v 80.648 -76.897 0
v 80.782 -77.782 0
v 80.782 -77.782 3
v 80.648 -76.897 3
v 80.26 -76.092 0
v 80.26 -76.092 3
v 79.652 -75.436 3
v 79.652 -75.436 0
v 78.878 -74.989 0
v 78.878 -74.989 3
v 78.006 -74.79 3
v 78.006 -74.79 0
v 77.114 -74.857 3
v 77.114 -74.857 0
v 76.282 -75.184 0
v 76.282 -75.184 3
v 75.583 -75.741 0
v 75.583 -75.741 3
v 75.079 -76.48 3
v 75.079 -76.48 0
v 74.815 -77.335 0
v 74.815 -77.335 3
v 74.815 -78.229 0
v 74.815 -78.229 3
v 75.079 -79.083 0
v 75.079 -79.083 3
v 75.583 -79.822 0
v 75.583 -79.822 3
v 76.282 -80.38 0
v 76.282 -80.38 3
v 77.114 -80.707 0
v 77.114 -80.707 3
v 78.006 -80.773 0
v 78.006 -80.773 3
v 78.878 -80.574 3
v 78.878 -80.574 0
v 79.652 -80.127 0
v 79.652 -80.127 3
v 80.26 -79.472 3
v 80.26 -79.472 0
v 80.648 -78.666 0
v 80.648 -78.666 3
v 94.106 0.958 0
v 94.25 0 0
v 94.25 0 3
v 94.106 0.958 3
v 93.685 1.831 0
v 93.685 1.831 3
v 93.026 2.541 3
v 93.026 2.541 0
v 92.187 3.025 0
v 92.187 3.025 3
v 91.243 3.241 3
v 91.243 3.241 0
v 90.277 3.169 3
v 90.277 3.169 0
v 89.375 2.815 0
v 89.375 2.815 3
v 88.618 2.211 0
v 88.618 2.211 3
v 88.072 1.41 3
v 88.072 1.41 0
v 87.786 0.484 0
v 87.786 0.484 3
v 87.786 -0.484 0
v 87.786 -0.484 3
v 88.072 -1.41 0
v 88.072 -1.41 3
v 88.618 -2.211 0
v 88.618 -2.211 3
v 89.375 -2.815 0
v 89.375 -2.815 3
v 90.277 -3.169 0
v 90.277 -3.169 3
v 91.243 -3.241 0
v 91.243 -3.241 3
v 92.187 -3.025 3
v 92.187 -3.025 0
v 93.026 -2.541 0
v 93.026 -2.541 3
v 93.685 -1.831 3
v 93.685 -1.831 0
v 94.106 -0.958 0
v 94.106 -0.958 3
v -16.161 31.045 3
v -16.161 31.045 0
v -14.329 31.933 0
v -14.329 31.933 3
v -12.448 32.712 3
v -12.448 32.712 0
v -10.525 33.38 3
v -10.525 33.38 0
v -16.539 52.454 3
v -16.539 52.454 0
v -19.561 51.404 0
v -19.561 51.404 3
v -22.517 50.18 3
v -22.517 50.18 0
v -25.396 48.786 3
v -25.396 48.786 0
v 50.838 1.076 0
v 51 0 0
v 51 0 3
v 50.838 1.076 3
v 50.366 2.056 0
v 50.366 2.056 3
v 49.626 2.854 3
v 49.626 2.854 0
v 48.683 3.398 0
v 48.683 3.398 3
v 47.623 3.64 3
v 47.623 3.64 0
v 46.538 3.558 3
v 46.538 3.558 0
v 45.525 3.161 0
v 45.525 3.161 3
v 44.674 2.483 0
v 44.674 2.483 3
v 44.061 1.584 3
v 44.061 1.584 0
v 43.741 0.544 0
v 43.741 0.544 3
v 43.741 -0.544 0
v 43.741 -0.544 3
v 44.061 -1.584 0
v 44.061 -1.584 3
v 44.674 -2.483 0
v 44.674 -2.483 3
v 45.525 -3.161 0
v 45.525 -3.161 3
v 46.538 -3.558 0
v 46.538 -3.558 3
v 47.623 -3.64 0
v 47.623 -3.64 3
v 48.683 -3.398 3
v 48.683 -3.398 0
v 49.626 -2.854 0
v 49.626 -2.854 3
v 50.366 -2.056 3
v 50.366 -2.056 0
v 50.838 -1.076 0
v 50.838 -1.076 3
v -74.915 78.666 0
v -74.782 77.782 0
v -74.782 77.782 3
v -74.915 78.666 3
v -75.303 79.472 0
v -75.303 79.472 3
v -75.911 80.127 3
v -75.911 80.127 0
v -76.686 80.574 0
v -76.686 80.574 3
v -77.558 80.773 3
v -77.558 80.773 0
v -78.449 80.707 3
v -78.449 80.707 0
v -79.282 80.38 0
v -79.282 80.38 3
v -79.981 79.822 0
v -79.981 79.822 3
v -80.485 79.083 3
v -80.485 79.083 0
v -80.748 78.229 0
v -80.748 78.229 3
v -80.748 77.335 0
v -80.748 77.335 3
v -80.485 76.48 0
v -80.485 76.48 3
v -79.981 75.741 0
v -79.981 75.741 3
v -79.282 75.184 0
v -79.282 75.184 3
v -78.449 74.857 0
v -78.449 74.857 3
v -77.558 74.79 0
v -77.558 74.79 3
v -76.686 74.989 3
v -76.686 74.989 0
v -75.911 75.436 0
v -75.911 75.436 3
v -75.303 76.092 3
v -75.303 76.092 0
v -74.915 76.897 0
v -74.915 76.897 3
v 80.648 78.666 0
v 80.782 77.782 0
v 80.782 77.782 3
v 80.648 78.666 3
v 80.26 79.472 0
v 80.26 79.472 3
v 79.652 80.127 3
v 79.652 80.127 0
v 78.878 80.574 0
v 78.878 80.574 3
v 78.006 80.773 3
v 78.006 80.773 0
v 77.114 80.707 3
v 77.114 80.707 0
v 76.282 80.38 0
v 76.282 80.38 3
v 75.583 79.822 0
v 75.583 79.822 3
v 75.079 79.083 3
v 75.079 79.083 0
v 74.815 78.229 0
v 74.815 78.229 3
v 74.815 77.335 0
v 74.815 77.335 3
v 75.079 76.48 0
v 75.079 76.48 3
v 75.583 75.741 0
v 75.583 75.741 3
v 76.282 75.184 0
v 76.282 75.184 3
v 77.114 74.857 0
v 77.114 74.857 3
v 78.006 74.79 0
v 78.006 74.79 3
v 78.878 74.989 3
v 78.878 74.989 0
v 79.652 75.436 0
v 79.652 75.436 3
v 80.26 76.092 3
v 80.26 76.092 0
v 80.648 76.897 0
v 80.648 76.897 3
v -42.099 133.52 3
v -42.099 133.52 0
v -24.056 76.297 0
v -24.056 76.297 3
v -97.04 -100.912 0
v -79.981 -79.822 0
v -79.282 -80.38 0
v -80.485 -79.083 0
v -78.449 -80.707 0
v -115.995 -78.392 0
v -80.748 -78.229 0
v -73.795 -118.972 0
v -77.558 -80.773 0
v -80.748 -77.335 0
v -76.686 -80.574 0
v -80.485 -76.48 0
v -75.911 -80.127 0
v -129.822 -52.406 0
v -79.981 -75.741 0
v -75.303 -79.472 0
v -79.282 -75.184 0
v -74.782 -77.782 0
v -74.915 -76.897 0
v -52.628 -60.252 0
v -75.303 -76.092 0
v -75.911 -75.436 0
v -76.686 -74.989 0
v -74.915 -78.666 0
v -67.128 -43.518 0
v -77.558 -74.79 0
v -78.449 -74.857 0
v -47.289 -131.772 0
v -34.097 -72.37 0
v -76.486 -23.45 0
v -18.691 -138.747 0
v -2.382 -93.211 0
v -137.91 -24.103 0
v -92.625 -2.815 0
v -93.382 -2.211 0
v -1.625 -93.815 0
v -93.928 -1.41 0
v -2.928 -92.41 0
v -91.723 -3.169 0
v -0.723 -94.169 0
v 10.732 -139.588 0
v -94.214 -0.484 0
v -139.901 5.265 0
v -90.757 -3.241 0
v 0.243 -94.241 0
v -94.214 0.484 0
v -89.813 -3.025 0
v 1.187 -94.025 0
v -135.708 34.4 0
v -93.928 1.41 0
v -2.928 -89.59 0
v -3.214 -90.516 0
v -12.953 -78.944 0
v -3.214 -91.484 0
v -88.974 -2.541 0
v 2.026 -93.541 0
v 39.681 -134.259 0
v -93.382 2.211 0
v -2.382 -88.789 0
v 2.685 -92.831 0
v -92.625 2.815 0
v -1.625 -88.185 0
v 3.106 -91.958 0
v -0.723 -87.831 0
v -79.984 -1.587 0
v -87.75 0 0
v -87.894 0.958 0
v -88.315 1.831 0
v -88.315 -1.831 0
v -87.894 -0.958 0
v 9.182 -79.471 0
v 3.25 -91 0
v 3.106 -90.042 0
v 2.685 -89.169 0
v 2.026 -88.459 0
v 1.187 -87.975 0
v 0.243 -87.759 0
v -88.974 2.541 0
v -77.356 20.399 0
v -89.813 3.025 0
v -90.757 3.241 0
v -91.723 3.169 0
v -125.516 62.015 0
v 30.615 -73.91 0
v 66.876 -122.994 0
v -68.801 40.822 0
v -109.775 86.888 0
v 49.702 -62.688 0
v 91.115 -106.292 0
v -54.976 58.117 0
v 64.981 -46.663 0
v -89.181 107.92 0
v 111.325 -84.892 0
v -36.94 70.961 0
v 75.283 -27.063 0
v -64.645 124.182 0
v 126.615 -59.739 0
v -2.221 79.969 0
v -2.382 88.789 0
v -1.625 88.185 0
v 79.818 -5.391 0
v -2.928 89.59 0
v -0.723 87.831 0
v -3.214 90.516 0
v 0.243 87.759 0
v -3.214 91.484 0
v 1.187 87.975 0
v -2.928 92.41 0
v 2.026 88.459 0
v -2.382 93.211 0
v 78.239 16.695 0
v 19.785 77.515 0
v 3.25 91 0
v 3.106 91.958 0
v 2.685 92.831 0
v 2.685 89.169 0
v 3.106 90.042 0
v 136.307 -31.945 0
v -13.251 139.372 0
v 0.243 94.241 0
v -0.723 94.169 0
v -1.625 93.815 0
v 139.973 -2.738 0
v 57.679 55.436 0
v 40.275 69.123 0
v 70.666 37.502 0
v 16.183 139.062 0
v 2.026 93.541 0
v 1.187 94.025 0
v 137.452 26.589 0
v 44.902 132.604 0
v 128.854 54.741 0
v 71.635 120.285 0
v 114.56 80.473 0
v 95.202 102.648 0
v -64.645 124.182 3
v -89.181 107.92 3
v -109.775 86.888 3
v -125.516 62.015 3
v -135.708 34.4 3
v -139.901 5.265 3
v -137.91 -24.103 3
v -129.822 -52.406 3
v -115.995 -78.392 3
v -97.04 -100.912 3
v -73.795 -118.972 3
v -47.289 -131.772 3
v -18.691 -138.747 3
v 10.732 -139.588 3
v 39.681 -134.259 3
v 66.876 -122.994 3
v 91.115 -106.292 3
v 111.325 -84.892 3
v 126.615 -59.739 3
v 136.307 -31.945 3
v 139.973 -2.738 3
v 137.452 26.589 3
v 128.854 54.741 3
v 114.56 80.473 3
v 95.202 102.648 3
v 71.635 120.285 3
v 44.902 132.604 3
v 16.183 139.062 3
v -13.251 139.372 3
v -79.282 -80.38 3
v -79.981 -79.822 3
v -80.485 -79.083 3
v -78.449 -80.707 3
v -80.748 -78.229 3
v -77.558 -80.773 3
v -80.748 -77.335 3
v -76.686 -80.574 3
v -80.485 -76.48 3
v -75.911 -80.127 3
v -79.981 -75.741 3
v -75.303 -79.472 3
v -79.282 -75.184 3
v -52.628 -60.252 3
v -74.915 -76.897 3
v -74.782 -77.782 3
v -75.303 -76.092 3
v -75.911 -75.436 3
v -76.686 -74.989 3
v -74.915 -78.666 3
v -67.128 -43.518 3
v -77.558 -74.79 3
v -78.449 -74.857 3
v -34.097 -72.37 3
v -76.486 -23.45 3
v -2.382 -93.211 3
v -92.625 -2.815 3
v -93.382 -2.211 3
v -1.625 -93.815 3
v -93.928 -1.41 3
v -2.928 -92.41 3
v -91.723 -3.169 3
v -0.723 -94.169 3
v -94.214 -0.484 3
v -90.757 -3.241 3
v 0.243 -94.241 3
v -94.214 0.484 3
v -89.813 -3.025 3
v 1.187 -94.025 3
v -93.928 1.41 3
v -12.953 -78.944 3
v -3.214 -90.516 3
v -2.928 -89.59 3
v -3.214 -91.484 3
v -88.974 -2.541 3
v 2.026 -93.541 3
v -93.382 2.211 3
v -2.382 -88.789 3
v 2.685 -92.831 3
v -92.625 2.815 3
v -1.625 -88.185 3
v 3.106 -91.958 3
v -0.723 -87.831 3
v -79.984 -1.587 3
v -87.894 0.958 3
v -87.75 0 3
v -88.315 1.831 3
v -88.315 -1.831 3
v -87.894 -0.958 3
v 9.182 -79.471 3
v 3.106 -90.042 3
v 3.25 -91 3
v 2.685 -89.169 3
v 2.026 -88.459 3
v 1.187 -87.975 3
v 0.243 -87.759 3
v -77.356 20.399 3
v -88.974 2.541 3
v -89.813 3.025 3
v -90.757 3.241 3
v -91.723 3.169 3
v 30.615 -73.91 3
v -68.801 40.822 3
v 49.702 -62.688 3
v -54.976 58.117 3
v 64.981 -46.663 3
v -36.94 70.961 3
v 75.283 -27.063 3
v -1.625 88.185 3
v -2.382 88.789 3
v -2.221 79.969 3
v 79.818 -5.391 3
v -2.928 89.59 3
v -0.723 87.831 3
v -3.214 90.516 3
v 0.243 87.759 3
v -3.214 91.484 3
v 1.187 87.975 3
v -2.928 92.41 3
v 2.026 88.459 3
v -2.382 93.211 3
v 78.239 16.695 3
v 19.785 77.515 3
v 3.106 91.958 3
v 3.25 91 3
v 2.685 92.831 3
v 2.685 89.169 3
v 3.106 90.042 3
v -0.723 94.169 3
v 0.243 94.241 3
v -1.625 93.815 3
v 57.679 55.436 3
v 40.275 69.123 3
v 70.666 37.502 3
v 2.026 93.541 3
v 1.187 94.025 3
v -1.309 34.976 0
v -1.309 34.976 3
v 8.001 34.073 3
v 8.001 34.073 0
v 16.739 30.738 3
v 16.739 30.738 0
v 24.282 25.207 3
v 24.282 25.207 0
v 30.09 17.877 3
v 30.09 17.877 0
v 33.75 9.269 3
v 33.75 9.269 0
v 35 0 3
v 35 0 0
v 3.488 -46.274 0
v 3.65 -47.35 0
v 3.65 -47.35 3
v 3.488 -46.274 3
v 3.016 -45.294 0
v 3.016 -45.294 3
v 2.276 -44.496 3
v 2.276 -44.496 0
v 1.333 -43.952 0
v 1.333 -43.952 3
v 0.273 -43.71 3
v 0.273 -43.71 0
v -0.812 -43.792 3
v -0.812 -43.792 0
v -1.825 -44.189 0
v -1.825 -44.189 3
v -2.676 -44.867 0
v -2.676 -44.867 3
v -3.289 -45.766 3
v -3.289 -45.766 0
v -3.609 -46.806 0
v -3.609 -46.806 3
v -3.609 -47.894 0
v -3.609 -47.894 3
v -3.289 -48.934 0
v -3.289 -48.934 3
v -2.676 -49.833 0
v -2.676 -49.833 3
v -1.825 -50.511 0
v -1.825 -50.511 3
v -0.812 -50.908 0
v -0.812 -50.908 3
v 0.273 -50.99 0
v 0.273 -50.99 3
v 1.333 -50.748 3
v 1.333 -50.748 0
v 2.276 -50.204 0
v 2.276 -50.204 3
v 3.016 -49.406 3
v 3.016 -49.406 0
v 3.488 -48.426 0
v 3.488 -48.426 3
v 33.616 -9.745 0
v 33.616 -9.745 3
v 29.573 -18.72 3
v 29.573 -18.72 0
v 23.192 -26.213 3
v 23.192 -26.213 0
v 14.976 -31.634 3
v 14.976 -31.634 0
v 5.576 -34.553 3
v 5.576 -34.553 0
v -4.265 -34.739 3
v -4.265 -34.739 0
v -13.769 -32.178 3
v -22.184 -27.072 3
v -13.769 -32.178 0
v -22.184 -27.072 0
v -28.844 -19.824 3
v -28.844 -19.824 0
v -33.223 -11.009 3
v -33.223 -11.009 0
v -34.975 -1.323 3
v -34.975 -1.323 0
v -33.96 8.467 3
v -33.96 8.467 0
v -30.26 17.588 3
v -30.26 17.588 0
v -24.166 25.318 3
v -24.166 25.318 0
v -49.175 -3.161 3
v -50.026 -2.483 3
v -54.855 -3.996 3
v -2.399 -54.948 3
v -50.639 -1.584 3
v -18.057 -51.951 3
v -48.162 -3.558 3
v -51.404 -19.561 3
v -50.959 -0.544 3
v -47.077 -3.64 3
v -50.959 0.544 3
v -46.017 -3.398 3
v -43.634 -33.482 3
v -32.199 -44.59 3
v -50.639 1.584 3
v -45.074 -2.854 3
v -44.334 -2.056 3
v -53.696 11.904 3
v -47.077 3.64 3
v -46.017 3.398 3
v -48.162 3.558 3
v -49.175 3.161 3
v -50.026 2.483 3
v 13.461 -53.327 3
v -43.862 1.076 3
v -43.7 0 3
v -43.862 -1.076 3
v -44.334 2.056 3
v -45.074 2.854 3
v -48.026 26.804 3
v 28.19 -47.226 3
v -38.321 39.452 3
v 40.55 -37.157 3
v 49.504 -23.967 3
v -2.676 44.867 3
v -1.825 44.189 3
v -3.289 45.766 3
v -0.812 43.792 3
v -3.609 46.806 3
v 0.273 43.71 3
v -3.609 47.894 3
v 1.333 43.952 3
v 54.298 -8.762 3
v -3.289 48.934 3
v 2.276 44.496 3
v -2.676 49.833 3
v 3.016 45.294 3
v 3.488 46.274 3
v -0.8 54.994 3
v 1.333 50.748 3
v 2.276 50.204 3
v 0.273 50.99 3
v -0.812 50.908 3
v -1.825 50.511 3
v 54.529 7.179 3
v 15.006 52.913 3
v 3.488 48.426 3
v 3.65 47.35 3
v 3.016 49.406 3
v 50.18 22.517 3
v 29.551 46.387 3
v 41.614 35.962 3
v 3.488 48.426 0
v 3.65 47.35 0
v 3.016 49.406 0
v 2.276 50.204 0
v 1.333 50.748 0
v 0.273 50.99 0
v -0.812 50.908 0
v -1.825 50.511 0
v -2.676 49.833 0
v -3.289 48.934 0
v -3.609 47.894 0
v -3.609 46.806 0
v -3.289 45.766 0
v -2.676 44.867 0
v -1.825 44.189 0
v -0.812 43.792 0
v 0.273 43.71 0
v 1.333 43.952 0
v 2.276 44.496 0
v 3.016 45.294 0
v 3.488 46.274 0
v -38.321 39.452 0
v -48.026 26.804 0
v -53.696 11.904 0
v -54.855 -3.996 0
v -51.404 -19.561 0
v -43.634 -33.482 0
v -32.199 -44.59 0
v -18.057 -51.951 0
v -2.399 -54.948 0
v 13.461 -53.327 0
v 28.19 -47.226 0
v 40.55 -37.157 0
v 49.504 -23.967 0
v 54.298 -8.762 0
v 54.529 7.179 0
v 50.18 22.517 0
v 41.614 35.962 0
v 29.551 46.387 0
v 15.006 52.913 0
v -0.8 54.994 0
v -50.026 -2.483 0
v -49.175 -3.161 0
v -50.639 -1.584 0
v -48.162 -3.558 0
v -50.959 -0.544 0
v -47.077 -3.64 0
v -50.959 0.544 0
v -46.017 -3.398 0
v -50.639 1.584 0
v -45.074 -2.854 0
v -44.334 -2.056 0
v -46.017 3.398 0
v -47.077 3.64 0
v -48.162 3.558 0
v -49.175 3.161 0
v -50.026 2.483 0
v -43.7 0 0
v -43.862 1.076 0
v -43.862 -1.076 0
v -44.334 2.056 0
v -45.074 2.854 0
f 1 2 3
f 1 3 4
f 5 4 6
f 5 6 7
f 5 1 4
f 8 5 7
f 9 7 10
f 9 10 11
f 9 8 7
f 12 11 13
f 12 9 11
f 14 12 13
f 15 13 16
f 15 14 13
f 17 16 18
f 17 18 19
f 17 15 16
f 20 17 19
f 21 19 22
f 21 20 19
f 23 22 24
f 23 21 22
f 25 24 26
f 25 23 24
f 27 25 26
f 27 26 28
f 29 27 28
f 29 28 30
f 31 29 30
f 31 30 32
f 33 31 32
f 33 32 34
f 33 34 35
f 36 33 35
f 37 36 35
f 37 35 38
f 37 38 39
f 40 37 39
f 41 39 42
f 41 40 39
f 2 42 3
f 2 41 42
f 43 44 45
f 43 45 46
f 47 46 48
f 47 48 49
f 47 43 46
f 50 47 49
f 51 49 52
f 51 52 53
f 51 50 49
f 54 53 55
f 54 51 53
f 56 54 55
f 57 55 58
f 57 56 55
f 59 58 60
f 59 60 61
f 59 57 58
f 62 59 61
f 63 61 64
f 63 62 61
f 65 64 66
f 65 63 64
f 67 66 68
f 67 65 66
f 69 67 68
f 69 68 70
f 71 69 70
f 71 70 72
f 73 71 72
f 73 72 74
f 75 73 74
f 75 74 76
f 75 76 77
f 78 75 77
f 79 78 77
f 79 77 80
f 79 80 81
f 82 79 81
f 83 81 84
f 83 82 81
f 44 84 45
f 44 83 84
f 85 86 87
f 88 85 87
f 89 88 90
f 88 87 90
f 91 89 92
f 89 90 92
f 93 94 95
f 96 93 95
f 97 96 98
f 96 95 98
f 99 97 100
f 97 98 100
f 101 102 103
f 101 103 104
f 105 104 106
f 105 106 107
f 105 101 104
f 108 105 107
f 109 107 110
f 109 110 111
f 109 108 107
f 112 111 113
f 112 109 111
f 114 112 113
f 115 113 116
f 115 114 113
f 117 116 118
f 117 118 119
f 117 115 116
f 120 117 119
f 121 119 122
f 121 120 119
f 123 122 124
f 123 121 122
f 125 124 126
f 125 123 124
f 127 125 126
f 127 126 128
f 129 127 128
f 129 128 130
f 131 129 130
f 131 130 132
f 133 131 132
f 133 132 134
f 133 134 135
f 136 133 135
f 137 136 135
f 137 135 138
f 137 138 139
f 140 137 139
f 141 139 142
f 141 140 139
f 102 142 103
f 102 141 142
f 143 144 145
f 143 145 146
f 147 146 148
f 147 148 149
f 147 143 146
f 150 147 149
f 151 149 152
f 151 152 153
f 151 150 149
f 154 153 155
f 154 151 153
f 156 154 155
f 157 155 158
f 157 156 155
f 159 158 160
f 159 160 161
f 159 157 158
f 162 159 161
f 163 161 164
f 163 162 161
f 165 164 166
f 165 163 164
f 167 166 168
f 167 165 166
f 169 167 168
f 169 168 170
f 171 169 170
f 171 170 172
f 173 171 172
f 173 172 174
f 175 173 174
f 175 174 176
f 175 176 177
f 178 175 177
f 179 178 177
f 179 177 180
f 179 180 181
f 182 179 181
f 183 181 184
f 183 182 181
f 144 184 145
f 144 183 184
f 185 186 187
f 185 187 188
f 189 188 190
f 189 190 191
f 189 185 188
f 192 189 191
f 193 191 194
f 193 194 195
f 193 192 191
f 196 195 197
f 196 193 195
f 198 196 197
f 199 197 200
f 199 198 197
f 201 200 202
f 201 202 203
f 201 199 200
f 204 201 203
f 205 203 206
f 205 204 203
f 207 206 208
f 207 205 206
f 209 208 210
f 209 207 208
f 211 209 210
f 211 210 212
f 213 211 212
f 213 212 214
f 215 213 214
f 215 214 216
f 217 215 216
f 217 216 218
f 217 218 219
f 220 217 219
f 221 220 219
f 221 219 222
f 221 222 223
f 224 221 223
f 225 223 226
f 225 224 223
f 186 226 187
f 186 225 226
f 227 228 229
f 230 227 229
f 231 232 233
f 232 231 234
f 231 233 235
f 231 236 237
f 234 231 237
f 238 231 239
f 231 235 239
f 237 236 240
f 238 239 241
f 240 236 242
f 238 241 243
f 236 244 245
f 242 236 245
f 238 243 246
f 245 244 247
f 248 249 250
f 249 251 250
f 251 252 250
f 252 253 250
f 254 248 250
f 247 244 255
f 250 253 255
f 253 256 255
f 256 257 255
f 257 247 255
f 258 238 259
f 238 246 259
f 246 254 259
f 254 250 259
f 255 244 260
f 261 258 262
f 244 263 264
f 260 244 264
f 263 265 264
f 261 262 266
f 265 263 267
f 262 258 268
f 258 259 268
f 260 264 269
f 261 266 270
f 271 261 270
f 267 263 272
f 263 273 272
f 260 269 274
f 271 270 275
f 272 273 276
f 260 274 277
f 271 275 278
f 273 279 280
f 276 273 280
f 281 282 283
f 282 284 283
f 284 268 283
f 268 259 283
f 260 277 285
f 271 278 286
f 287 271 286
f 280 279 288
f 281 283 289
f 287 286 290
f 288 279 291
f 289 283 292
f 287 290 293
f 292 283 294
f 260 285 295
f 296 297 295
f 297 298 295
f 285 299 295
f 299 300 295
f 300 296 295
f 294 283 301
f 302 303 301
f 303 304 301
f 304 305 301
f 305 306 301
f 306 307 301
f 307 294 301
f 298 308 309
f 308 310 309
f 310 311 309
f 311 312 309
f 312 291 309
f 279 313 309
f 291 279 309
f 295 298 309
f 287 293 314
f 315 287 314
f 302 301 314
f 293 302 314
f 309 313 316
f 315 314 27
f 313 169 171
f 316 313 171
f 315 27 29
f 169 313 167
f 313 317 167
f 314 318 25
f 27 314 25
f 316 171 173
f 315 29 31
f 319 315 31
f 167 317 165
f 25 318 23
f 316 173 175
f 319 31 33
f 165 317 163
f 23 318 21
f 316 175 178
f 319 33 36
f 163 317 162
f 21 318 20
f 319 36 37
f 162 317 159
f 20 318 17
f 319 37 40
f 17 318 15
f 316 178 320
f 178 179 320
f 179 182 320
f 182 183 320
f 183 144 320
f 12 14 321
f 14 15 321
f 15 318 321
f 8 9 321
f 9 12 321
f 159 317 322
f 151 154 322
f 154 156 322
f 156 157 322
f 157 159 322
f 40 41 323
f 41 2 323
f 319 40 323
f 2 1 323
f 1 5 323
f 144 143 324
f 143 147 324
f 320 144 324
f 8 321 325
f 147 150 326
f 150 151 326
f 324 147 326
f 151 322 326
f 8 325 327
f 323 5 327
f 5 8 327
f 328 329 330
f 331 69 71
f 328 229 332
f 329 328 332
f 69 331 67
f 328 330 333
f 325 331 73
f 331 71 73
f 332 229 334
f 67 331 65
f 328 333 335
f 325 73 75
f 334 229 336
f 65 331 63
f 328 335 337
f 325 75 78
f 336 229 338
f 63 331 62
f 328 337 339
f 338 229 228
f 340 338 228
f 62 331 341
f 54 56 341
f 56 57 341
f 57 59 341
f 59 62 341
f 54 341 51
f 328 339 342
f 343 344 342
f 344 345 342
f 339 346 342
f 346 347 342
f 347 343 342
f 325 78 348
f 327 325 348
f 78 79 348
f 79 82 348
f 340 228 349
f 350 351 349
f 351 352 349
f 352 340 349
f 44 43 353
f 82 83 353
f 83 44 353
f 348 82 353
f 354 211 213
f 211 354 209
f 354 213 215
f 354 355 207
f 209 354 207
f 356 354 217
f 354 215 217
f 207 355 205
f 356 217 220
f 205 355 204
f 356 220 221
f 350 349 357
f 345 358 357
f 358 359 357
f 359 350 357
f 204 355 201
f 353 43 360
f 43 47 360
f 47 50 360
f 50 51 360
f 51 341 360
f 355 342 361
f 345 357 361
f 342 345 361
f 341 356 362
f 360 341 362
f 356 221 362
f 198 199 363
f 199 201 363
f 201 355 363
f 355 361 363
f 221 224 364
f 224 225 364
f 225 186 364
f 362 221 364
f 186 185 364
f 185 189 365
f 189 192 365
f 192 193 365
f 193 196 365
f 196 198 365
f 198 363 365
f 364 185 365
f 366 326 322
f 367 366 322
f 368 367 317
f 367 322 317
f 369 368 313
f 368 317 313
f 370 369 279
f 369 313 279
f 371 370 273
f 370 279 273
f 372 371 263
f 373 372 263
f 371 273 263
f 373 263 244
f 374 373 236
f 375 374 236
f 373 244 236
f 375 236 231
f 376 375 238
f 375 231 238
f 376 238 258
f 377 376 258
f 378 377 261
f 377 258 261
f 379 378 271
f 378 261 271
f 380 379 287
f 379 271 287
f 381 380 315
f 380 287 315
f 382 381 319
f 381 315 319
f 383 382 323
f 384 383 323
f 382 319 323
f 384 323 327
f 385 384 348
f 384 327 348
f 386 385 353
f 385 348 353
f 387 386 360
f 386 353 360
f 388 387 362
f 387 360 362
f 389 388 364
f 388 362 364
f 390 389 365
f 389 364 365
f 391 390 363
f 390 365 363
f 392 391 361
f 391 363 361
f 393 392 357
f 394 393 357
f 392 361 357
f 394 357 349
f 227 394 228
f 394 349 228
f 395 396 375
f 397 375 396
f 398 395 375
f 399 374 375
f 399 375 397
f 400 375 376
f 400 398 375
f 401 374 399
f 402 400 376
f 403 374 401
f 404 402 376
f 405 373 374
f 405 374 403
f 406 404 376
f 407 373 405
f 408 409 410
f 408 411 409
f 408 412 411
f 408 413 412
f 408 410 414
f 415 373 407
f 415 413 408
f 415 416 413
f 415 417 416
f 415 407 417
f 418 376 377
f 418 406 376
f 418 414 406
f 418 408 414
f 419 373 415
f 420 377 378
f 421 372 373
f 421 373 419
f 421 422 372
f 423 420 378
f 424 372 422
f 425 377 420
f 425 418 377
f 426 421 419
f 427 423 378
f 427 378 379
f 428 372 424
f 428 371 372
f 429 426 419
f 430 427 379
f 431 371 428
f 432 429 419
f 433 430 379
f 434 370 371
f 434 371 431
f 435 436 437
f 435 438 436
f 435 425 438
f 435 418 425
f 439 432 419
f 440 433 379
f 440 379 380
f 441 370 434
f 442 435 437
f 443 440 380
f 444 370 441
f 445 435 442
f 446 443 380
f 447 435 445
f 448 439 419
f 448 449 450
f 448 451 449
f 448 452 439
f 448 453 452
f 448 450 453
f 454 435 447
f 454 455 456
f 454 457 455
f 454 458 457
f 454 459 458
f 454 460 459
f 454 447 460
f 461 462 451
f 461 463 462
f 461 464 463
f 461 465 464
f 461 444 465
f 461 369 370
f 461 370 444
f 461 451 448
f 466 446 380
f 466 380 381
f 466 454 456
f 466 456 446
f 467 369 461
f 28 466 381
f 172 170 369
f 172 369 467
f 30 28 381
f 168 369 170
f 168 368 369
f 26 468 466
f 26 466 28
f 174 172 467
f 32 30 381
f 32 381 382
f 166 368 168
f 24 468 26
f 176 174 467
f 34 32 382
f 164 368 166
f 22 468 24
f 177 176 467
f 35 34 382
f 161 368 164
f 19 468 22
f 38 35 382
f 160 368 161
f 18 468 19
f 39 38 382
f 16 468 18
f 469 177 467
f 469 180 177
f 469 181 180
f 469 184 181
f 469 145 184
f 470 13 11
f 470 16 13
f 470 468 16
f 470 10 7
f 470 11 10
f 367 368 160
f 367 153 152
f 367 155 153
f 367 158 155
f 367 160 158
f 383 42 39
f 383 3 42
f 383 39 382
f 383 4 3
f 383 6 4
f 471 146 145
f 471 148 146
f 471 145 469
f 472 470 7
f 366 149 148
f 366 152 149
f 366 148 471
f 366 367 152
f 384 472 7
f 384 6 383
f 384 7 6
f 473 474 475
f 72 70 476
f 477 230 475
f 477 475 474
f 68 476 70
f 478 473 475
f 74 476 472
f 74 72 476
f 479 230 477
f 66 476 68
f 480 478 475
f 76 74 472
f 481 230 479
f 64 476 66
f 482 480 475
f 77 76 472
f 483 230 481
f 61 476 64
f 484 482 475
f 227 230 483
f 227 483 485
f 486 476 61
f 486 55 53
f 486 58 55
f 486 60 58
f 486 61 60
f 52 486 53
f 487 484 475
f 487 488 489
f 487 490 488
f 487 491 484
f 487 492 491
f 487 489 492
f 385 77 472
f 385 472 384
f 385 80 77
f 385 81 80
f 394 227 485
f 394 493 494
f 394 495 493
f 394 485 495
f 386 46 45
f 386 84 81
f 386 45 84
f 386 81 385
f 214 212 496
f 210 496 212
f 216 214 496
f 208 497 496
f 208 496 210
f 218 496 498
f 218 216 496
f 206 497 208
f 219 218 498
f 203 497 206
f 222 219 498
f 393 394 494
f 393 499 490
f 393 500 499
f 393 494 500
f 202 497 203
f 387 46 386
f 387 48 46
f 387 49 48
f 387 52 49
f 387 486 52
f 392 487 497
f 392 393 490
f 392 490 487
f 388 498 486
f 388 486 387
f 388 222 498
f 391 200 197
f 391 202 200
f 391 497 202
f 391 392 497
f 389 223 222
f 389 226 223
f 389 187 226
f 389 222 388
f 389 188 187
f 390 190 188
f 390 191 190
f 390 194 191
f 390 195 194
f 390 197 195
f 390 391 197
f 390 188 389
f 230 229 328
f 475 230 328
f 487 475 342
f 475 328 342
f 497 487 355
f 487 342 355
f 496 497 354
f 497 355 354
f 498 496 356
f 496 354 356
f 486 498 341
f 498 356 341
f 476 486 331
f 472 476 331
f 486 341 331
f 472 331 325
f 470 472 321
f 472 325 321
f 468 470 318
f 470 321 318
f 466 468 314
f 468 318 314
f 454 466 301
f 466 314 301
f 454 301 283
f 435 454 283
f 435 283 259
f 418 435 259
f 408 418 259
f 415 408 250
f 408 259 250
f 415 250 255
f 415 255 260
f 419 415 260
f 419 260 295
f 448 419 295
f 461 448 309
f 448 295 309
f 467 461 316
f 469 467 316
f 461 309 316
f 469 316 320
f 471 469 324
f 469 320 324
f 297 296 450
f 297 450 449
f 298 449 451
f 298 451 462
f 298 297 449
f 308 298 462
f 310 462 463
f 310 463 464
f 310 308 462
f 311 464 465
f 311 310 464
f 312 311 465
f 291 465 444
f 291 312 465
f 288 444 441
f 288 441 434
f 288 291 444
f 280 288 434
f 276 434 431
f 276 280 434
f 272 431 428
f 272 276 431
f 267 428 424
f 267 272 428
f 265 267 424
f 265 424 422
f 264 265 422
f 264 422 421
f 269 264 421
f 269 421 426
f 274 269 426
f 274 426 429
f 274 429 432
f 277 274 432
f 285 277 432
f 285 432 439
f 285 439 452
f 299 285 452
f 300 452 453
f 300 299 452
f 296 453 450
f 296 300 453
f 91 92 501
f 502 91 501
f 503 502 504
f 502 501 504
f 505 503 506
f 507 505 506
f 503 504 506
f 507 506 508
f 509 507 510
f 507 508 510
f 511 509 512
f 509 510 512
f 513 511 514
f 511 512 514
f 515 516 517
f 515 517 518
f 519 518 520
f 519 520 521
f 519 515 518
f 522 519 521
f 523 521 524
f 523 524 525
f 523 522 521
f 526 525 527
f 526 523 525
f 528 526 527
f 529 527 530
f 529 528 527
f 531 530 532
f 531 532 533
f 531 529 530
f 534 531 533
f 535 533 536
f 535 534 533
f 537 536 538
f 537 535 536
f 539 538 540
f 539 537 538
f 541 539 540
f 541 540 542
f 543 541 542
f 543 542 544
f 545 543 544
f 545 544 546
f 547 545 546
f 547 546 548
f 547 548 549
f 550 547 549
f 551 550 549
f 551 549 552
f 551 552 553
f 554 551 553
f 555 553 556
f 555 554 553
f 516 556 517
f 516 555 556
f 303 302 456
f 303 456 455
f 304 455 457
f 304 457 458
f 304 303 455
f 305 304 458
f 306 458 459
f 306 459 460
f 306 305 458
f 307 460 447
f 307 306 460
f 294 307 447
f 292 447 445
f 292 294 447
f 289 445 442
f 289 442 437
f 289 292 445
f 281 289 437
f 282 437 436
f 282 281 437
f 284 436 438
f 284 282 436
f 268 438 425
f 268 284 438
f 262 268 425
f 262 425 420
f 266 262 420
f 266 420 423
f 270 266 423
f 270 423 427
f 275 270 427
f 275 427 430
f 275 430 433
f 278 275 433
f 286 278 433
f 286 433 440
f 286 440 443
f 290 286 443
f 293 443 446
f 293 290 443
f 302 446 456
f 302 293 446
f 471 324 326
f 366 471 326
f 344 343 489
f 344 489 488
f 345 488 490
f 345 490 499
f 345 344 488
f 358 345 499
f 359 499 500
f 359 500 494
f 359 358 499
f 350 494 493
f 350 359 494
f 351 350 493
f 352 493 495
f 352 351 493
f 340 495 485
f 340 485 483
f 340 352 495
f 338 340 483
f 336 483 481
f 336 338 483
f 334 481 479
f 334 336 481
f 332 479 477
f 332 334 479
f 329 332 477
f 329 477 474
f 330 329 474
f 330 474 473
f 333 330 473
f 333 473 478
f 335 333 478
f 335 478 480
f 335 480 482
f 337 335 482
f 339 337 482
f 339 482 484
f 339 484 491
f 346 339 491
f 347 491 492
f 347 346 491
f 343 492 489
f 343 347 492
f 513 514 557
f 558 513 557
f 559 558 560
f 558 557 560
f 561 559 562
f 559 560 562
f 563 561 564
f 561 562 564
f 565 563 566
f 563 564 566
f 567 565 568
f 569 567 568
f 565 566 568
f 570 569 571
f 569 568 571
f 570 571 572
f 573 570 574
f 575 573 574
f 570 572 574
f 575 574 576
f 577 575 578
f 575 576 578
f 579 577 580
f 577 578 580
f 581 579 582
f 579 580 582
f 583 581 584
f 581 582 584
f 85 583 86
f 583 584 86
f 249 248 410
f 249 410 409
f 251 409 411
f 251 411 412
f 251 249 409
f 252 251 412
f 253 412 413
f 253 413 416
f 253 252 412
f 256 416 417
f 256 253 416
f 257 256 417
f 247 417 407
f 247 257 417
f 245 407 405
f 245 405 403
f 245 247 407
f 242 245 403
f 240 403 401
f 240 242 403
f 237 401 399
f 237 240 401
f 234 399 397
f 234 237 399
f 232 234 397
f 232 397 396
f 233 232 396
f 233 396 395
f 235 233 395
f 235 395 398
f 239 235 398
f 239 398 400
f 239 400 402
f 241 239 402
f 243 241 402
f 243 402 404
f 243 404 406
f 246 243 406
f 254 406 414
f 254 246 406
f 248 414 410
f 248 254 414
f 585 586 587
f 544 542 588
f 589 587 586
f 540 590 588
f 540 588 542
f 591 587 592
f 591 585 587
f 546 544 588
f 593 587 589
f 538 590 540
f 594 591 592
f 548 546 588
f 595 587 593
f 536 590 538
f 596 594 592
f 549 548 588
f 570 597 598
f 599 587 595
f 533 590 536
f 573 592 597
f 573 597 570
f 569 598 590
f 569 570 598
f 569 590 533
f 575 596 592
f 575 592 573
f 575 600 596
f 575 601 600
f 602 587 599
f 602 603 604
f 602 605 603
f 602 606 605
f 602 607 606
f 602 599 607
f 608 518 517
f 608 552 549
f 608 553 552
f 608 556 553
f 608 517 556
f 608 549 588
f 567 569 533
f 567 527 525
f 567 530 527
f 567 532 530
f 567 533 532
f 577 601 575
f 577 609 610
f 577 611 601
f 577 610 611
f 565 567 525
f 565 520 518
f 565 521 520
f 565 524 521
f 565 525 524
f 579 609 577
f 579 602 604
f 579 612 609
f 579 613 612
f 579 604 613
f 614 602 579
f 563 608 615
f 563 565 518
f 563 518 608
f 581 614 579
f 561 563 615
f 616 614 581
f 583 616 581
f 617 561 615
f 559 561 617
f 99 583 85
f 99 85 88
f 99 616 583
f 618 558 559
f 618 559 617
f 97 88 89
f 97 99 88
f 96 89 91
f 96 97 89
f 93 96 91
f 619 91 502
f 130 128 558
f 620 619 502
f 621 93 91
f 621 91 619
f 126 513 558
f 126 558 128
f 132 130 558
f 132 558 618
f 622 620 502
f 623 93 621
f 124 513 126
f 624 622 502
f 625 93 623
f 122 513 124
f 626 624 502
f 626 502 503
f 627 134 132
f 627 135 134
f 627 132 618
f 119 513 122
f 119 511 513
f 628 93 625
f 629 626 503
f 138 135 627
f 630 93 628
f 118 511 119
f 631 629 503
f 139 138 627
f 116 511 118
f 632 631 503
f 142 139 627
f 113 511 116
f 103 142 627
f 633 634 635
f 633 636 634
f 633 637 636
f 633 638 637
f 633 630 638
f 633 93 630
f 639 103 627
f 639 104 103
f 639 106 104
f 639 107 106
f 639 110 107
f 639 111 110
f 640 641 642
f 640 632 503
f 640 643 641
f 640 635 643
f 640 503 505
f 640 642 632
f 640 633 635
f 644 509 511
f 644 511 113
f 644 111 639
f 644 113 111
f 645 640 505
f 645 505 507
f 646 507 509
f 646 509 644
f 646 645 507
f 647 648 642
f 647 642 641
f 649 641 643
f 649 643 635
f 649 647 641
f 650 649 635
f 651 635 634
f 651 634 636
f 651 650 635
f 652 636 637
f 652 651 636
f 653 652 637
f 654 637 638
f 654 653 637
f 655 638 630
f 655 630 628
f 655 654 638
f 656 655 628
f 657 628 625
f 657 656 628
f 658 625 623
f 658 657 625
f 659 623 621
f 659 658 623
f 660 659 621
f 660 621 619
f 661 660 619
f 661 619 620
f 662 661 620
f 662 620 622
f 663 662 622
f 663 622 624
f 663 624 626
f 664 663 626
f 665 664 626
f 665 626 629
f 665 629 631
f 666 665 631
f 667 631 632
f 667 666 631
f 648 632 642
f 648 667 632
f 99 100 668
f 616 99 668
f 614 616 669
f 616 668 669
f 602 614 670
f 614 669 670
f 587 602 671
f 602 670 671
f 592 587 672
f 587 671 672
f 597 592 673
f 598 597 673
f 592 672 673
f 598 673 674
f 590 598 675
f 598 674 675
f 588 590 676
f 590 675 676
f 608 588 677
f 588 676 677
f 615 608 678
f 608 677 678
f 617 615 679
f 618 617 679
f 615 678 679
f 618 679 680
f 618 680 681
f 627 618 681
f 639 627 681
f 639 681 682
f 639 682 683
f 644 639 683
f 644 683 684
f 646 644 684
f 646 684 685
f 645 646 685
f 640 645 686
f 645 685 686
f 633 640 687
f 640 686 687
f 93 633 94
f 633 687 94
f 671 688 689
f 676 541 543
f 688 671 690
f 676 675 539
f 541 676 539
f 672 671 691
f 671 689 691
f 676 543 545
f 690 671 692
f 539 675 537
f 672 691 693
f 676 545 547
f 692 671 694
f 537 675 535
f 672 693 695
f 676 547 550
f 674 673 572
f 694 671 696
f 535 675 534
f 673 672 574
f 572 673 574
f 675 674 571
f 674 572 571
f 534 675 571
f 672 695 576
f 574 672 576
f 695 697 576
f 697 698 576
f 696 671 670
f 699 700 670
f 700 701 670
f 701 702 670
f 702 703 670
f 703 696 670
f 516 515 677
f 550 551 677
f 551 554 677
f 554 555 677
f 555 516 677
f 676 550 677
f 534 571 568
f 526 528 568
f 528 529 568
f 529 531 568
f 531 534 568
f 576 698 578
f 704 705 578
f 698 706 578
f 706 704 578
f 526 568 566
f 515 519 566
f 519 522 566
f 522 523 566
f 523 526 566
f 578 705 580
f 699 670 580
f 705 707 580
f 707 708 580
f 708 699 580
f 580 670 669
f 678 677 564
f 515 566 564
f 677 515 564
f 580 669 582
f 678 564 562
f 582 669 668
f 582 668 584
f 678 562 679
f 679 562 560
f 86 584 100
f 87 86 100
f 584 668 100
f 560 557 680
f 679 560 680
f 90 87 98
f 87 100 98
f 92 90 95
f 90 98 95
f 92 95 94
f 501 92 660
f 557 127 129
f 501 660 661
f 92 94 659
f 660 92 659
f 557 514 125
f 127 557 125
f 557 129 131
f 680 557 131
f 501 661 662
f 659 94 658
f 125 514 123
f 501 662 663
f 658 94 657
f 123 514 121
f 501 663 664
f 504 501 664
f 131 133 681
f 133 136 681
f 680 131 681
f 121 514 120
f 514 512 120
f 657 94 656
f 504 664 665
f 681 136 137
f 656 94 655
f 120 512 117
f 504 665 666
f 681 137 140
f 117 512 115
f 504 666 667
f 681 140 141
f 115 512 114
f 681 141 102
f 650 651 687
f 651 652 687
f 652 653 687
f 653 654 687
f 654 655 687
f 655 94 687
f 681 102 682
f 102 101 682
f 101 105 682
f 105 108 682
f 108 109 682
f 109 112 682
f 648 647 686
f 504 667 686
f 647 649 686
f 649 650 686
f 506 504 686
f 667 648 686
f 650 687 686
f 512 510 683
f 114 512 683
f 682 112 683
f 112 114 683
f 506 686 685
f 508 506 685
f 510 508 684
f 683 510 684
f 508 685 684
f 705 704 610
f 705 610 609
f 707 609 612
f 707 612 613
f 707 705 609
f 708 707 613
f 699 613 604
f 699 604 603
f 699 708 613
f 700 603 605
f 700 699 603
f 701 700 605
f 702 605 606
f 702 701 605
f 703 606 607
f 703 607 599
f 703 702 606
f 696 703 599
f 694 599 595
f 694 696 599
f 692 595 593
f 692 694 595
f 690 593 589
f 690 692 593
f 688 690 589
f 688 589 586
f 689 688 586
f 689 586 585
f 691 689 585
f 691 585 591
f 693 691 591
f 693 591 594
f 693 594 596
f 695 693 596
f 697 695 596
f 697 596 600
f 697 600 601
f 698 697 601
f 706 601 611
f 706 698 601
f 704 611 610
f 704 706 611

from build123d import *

# Parameters (mm, degrees)
F0_R     = 3
F0_R_2   = 3.25
F1_DEPTH = 3
F0_R_3   = 3.65
F2_DEPTH = 3


# Not quite as in the source:
# - a feature names something its author has since deleted; it is built from what else it names


with BuildPart() as f1:
    # F0 (on Top) → F1 (new body)
    with BuildSketch(Plane.XY):
        with BuildLine():
            ThreePointArc((-24.0564639603, 76.2973560599), (47.3047718691, 64.5155683414), (80, 0))
            ThreePointArc((80, 0), (-41.5018606528, -68.3929496538), (-36.9398890588, 70.9608666543))
            Line((-36.9398890588, 70.9608666543), (-64.6448058529, 124.181516645))
            ThreePointArc((-64.6448058529, 124.181516645), (-72.6282561425, -119.6876618942), (140, 0))
            ThreePointArc((140, 0), (82.7833507709, 112.9022445974), (-42.0988119306, 133.5203731048))
            Line((-42.0988119306, 133.5203731048), (-24.0564639603, 76.2973560599))
        make_face()
        with Locations((-77.7817459305, -77.7817459305)):
            Circle(F0_R, mode=Mode.SUBTRACT)
        with Locations((0, -91)):
            Circle(F0_R_2, mode=Mode.SUBTRACT)
        with Locations((77.7817459305, -77.7817459305)):
            Circle(F0_R, mode=Mode.SUBTRACT)
        with Locations((-91, 0)):
            Circle(F0_R_2, mode=Mode.SUBTRACT)
        with Locations((-77.7817459305, 77.7817459305)):
            Circle(F0_R, mode=Mode.SUBTRACT)
        with Locations((91, 0)):
            Circle(F0_R_2, mode=Mode.SUBTRACT)
        with Locations((0, 91)):
            Circle(F0_R_2, mode=Mode.SUBTRACT)
        with Locations((77.7817459305, 77.7817459305)):
            Circle(F0_R, mode=Mode.SUBTRACT)
    extrude(amount=F1_DEPTH)


with BuildPart() as f2:
    # F0 (on Top) → F2 (new body)
    with BuildSketch(Plane.XY):
        with BuildLine():
            ThreePointArc((55, 0), (32.52203066, 44.3544532347), (-16.5388189727, 52.4544322912))
            Line((-16.5388189727, 52.4544322912), (-10.5247029826, 33.3800932762))
            ThreePointArc((-10.5247029827, 33.3800932762), (20.6958376927, 28.2255611494), (35, 0))
            ThreePointArc((35, 0), (-18.1570640356, -29.9219154736), (-16.1612014632, 31.0453791612))
            Line((-16.1612014632, 31.0453791612), (-25.3961737279, 48.7855958248))
            ThreePointArc((-25.3961737279, 48.7855958248), (-28.5325291988, -47.020152887), (55, 0))
        make_face()
        with Locations((0, -47.35)):
            Circle(F0_R_3, mode=Mode.SUBTRACT)
        with Locations((-47.35, 0)):
            Circle(F0_R_3, mode=Mode.SUBTRACT)
        with Locations((47.35, 0)):
            Circle(F0_R_3, mode=Mode.SUBTRACT)
        with Locations((0, 47.35)):
            Circle(F0_R_3, mode=Mode.SUBTRACT)
        with BuildLine():
            Line((-10.5247029826, 33.3800932762), (-16.5388189727, 52.4544322912))
            ThreePointArc((-16.5388189727, 52.4544322912), (-21.0475887801, 50.8133742881), (-25.3961737279, 48.7855958248))
            Line((-25.3961737279, 48.7855958248), (-16.1612014632, 31.0453791612))
            ThreePointArc((-16.1612014632, 31.0453791612), (-13.3939201328, 32.3357836379), (-10.5247029827, 33.3800932762))
        make_face()
    extrude(amount=F2_DEPTH)


solid = Compound([f1.part, f2.part])
